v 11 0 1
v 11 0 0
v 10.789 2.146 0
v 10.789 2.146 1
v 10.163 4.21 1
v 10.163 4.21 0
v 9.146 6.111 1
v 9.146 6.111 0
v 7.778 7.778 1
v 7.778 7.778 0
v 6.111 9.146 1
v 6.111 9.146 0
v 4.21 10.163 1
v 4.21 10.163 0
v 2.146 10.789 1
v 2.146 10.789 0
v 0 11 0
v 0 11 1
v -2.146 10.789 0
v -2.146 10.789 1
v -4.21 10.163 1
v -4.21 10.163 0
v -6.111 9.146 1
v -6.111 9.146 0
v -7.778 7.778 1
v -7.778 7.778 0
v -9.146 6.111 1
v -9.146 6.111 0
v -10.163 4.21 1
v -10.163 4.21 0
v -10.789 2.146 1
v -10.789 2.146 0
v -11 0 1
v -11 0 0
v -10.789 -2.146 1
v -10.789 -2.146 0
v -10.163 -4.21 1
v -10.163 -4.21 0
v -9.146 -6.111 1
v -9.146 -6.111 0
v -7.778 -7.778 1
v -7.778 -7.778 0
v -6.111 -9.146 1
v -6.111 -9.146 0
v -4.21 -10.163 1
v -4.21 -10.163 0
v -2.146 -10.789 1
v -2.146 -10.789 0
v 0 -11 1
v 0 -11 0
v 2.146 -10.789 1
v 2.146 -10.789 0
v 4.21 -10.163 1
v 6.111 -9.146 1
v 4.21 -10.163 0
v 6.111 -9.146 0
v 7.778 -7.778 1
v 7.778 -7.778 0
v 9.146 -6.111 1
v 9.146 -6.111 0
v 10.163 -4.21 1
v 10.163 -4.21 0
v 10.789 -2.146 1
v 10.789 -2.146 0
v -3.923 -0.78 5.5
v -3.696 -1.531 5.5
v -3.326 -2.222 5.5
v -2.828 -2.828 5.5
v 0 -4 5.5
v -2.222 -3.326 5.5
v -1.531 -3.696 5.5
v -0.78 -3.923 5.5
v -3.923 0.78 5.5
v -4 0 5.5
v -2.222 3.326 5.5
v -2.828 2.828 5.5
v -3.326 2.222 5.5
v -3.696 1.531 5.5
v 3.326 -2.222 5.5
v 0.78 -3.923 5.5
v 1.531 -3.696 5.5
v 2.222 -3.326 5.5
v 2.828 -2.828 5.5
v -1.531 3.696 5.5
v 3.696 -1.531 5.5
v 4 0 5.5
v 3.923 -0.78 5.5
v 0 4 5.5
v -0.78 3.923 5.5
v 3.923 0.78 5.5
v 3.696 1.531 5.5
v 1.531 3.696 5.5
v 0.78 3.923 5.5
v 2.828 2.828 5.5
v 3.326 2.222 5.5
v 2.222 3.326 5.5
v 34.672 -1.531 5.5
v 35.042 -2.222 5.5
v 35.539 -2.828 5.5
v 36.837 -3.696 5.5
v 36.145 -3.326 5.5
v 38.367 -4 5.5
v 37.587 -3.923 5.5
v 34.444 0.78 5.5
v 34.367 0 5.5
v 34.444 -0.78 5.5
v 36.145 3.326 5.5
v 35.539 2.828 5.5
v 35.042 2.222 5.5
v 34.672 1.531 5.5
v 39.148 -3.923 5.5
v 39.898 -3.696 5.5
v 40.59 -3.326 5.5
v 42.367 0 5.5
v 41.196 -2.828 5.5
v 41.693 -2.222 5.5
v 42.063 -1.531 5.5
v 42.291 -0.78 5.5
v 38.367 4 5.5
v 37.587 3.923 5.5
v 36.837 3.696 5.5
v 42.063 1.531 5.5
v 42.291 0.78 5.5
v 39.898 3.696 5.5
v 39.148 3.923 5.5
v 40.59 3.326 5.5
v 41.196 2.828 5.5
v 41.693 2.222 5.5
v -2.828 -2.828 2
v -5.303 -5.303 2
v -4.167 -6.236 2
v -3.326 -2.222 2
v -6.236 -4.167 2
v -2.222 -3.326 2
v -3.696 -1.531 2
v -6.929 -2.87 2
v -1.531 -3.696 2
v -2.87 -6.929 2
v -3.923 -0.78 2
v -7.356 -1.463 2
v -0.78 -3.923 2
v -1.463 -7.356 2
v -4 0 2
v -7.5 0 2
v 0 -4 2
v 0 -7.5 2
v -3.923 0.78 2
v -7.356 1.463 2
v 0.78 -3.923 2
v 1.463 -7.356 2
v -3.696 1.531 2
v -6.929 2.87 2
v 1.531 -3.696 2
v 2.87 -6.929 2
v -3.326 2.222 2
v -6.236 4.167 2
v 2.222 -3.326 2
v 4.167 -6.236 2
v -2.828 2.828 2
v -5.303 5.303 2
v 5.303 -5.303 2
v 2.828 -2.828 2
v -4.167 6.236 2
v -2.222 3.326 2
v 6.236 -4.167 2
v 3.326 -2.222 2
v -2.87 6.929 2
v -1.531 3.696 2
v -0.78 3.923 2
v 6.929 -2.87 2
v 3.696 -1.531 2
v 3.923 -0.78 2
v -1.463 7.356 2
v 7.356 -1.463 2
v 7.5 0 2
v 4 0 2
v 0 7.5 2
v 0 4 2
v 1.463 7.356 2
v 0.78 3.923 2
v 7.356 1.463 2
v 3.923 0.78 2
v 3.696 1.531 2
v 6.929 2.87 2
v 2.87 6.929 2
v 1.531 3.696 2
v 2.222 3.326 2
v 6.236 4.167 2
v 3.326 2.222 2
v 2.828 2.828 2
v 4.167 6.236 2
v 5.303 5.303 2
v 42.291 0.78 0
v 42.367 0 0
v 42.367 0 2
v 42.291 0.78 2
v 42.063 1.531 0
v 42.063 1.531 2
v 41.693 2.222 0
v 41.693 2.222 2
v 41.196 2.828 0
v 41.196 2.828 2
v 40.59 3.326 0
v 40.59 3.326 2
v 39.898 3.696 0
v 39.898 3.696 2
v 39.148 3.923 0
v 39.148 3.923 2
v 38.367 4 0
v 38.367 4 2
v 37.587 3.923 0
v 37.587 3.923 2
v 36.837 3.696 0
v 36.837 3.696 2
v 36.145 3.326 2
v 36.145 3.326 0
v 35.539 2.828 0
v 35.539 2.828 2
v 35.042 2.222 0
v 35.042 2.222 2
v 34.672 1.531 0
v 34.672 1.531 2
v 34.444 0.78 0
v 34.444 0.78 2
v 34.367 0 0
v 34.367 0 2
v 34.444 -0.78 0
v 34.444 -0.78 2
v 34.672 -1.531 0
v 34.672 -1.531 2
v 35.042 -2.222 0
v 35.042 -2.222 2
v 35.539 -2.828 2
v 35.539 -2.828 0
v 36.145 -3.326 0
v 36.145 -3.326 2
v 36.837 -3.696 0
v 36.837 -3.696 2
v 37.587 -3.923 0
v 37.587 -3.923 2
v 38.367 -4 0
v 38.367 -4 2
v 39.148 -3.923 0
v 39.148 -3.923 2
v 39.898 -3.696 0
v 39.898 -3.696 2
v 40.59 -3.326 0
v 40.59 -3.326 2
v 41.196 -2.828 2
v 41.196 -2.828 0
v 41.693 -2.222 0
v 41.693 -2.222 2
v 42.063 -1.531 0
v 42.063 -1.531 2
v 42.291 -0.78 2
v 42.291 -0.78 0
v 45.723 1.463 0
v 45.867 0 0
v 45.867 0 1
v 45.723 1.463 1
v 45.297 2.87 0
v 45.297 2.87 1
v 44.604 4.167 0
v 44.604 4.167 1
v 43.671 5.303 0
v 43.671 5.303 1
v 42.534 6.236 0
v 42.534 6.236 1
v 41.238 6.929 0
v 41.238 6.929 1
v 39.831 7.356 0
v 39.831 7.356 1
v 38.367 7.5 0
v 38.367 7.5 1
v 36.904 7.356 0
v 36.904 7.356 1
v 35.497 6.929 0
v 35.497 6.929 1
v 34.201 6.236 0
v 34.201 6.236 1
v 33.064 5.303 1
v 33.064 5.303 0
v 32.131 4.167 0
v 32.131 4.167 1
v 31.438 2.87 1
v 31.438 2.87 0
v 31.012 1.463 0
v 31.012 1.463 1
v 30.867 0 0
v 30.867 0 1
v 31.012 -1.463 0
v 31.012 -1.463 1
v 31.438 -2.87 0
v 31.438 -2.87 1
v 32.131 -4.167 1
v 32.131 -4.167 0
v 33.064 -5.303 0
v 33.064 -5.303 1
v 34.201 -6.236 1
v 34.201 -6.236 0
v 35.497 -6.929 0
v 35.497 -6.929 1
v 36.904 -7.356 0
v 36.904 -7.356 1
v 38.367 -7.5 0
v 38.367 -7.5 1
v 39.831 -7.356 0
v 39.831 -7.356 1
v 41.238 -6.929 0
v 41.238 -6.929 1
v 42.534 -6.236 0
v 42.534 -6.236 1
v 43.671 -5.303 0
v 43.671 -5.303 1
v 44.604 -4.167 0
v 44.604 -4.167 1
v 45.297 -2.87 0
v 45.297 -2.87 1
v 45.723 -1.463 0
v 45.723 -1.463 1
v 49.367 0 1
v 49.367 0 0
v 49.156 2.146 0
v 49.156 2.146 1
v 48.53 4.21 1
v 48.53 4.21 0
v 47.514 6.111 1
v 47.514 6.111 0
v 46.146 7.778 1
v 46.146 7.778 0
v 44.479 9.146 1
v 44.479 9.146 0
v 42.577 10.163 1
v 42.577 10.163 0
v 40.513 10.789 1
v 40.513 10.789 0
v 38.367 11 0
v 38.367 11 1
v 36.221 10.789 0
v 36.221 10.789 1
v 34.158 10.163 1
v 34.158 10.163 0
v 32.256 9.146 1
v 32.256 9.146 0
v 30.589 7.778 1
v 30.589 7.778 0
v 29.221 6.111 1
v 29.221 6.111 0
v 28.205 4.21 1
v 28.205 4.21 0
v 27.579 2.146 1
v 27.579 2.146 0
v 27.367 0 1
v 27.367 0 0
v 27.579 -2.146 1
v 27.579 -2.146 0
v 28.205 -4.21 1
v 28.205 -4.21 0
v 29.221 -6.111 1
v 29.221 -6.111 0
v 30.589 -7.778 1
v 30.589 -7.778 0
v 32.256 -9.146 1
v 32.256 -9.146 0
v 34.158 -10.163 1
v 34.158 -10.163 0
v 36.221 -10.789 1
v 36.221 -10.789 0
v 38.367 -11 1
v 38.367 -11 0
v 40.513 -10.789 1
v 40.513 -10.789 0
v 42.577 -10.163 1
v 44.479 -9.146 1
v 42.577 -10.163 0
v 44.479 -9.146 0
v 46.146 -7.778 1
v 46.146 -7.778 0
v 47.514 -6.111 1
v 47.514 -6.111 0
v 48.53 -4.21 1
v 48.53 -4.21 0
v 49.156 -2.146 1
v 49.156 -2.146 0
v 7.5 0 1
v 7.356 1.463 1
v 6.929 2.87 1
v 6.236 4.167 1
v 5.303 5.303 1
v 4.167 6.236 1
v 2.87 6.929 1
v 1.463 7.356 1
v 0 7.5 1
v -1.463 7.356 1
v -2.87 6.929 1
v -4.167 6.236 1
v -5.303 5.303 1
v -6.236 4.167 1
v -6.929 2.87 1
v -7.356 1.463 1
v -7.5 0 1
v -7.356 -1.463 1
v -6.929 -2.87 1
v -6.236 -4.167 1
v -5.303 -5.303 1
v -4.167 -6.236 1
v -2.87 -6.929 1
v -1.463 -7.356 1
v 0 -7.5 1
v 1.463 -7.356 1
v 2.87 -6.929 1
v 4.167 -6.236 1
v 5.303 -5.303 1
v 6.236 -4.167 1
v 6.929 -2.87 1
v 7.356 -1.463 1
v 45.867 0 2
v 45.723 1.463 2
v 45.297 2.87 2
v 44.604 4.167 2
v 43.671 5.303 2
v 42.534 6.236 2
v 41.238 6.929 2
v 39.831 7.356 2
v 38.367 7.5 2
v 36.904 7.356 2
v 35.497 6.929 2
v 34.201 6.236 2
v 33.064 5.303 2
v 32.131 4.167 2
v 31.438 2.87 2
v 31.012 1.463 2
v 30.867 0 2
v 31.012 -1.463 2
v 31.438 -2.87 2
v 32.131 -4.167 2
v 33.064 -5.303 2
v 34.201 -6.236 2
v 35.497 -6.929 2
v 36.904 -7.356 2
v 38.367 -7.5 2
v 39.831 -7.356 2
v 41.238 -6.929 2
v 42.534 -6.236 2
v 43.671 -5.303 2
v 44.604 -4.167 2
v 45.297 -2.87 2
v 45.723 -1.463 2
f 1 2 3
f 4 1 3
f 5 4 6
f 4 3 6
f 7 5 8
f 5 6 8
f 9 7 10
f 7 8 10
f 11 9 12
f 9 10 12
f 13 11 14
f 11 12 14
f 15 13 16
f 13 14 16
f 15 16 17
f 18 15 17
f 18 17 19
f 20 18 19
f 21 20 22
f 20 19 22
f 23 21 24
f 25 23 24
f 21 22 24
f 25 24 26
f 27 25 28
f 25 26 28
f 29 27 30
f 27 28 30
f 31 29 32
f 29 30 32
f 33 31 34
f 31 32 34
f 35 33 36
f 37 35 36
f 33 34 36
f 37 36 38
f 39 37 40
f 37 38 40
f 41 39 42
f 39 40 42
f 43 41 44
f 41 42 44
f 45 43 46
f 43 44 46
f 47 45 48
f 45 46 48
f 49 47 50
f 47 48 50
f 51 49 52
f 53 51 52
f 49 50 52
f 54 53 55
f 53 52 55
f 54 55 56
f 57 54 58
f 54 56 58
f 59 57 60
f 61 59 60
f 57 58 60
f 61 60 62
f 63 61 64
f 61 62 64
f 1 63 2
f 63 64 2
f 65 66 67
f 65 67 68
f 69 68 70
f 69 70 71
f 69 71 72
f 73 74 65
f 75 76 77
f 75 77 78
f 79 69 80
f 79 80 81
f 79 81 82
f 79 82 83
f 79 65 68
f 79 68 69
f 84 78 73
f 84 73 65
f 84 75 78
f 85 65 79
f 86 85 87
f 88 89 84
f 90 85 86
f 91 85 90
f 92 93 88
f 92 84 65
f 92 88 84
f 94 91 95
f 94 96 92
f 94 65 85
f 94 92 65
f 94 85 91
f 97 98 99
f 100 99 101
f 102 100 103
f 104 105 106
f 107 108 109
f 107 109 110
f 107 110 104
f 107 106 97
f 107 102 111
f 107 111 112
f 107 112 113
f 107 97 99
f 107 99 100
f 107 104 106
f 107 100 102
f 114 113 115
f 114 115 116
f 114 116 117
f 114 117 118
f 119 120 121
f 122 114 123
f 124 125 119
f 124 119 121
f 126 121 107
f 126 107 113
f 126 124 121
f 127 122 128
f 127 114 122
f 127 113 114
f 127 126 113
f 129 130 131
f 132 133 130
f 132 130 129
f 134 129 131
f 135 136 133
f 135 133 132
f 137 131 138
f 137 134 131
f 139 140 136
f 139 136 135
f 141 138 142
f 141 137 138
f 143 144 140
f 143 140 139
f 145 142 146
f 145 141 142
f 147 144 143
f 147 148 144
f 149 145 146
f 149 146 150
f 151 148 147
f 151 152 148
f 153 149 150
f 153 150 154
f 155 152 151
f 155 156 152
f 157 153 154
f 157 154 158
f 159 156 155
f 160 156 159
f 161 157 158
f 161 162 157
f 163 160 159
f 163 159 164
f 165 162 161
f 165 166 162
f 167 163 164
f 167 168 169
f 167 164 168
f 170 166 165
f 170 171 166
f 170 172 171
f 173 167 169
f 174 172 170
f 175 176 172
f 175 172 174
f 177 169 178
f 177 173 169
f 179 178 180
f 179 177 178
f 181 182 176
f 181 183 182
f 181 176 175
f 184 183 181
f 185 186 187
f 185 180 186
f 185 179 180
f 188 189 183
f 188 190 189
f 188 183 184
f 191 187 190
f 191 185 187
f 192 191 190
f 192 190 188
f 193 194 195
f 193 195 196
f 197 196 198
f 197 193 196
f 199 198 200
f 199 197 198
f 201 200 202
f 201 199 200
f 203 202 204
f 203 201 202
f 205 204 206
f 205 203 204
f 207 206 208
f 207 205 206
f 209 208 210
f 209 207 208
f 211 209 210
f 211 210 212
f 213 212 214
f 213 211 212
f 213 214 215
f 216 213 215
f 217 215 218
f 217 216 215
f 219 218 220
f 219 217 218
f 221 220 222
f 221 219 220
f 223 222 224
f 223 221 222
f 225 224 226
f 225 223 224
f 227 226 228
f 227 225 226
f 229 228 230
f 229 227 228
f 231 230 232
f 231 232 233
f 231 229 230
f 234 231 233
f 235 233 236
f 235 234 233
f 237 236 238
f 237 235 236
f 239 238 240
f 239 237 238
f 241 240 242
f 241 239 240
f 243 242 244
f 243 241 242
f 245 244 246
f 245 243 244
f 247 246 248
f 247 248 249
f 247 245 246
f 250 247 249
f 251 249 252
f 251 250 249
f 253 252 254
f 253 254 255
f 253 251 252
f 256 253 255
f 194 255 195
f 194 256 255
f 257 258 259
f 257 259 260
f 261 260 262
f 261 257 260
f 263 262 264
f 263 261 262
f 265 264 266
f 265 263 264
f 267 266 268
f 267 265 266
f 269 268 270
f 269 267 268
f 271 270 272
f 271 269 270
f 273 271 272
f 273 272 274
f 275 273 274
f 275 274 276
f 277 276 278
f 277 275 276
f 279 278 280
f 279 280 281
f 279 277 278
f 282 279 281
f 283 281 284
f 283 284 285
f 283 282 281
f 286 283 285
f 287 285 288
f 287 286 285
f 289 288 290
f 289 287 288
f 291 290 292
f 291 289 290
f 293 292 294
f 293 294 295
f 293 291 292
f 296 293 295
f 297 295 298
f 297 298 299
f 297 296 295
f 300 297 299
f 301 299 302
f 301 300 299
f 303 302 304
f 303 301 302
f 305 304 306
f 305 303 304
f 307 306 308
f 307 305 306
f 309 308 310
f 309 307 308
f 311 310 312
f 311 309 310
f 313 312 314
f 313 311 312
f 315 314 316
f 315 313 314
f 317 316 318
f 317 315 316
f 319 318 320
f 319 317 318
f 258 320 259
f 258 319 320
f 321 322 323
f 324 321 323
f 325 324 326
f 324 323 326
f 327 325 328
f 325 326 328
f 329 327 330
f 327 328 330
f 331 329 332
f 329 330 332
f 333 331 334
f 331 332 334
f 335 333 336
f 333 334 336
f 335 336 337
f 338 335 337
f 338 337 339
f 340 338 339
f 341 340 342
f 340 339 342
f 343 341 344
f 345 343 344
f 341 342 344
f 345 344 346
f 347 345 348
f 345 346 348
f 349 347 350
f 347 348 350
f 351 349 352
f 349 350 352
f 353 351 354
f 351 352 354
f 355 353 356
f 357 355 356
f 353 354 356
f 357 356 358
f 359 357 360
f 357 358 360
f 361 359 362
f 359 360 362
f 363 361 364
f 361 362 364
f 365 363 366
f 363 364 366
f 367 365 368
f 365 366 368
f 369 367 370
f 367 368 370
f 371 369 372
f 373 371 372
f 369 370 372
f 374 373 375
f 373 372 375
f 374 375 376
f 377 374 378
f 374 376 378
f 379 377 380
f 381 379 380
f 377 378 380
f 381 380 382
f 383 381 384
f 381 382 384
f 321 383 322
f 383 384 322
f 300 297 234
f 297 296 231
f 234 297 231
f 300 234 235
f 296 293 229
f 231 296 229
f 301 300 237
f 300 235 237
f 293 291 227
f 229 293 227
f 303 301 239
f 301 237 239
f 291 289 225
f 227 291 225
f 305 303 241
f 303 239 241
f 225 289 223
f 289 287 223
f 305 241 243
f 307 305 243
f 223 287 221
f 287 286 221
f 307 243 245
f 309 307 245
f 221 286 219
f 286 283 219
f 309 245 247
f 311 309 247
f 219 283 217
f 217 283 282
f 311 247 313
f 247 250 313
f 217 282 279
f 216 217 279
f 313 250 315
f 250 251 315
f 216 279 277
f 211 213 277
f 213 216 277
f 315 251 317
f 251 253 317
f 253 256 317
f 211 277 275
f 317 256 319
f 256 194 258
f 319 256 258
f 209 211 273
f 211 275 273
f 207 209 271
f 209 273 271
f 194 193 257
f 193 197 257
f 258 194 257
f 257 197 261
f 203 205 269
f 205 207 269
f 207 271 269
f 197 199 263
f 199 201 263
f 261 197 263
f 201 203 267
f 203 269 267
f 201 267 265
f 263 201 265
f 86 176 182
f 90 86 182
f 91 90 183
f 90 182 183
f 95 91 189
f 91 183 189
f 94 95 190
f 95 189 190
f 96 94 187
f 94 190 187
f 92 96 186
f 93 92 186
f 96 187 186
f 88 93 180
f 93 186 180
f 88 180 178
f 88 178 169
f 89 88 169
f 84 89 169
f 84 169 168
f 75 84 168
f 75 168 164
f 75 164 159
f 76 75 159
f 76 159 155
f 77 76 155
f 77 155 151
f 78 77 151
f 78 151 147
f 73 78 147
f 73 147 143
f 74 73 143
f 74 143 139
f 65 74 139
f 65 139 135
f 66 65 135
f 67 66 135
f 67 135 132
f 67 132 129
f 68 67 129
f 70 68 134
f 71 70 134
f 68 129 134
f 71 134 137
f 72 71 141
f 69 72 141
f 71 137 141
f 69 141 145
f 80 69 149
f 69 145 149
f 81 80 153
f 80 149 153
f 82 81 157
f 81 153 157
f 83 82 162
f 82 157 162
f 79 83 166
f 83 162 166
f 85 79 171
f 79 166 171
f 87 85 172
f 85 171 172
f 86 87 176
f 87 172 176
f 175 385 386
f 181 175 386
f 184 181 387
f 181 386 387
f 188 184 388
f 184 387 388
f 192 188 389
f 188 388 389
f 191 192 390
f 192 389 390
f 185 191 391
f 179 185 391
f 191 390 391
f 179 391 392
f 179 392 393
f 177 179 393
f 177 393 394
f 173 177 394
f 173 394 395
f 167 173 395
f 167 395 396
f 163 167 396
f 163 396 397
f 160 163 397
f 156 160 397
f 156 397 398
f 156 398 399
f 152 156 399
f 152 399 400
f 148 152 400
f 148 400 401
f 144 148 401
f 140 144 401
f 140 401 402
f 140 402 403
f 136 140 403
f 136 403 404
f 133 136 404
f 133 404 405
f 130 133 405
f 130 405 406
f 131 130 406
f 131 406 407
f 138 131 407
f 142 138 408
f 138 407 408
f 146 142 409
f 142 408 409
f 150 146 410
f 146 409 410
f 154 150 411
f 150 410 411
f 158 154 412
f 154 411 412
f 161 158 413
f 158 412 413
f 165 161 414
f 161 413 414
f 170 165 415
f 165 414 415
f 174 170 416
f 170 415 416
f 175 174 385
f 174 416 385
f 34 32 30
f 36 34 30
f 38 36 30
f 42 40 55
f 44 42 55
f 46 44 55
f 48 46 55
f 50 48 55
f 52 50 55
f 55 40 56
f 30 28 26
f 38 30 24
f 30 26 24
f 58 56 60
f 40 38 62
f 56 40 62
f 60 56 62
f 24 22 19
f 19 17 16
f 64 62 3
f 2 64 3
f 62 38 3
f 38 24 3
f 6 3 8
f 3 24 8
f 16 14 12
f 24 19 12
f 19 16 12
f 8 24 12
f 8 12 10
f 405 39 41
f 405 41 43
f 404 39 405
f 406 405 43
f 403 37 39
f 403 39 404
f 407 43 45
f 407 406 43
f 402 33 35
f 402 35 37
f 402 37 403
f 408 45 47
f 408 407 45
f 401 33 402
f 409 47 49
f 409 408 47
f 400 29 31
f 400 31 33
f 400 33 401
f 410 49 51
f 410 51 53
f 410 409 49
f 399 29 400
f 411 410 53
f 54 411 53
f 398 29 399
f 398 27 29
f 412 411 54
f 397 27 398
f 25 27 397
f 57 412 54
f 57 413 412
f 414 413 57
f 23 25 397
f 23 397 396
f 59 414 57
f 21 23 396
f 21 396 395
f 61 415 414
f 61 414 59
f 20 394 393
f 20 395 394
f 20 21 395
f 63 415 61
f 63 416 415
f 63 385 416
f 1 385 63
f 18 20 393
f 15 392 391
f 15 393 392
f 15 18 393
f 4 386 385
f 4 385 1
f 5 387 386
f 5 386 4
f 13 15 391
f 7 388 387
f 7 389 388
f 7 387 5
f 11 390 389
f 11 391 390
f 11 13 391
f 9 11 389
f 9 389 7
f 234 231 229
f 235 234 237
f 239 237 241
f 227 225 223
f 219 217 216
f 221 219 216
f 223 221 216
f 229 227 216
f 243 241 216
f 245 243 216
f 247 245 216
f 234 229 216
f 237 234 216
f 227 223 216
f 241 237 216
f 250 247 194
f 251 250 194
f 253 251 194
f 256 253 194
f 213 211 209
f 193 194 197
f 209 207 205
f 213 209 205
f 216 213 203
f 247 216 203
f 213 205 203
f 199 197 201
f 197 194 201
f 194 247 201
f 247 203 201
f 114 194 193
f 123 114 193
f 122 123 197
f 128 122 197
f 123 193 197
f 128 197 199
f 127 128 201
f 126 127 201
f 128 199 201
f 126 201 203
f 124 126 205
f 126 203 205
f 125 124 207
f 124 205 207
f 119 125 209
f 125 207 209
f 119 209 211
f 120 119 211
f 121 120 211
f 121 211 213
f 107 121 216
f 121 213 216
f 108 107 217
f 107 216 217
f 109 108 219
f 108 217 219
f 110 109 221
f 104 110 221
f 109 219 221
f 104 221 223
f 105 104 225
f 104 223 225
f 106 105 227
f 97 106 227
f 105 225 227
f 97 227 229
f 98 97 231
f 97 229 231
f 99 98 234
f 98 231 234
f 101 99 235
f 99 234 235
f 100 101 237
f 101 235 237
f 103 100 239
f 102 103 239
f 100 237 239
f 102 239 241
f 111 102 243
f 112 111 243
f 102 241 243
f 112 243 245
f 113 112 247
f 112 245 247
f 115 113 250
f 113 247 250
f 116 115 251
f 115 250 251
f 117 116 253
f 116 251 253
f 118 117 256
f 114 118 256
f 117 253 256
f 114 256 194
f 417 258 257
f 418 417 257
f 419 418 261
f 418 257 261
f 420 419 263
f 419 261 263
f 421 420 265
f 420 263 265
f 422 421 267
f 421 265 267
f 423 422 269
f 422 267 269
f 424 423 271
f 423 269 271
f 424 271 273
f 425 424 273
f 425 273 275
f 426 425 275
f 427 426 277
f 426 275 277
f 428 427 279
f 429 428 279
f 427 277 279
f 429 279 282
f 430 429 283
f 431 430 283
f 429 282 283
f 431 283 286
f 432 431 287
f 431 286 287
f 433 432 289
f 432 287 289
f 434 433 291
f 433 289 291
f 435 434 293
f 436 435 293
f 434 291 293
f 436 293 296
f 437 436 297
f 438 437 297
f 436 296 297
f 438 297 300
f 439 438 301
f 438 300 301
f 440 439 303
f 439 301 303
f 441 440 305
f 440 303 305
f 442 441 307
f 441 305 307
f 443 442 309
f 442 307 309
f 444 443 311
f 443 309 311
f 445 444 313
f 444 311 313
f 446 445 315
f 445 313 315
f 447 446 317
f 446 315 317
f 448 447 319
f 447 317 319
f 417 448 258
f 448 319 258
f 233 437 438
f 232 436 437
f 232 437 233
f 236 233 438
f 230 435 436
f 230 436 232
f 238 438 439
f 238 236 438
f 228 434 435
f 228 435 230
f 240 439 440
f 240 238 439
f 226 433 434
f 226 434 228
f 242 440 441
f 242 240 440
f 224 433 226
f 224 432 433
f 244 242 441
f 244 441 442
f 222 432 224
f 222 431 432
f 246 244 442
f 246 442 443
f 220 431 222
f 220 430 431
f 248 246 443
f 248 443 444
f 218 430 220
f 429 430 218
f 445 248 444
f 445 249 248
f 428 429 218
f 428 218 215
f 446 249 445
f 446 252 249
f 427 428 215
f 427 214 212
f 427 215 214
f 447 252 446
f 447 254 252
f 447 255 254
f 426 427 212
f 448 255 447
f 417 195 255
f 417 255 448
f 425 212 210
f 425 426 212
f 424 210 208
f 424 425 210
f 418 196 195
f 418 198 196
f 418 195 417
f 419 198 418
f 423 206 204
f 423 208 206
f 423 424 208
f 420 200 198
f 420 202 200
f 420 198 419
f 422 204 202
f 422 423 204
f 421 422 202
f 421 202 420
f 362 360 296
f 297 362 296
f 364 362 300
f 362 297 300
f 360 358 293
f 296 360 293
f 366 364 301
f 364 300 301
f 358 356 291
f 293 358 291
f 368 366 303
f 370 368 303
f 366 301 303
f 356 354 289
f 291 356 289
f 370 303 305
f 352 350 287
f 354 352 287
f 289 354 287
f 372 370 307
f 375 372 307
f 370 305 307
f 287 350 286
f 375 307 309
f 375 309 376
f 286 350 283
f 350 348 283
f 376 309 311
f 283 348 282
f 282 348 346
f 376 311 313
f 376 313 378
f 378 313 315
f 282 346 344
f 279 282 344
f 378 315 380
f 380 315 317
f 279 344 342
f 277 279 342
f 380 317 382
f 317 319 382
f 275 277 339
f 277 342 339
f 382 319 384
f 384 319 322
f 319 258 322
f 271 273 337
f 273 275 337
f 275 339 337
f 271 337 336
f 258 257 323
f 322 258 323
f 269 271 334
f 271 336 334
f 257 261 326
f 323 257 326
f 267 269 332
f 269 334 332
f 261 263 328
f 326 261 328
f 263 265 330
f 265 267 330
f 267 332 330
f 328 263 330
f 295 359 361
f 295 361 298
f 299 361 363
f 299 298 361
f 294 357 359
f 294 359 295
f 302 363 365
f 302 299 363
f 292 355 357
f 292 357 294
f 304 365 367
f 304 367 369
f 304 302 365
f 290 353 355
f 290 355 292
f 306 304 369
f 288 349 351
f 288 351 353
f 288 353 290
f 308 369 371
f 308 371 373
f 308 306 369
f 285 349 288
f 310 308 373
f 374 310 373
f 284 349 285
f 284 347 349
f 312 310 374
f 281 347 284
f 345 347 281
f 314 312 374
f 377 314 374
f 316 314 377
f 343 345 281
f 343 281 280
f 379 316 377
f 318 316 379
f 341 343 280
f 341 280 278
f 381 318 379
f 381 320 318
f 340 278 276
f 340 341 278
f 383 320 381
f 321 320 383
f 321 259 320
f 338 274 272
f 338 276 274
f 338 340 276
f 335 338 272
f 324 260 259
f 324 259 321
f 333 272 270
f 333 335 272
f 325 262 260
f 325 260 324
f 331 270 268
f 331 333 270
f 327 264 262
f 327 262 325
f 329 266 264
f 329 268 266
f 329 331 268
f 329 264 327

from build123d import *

# Parameters (mm, degrees)
F0_R     = 11
F0_R_2   = 7.5
F1_DEPTH = 1
F0_R_3   = 4
F2_DEPTH = 2
F3_DEPTH = 5.5


with BuildPart() as f1:
    # F0 (on Top) → F1 (new body)
    with BuildSketch(Plane.XY):
        Circle(F0_R)
        Circle(F0_R_2, mode=Mode.SUBTRACT)
    extrude(amount=F1_DEPTH)

    # F0 (on Top) → F2 (join)
    with BuildSketch(Plane.XY):
        Circle(F0_R_2)
        Circle(F0_R_3, mode=Mode.SUBTRACT)
    extrude(amount=F2_DEPTH)

    # F0 (on Top) → F3 (join)
    with BuildSketch(Plane.XY):
        Circle(F0_R_3)
    extrude(amount=F3_DEPTH)


with BuildPart() as f1b:
    # F0 (on Top) → F1, piece 2 (new body)
    with BuildSketch(Plane.XY):
        with Locations((38.3674800396, 0)):
            Circle(F0_R)
        with Locations((38.3674800396, 0)):
            Circle(F0_R_2, mode=Mode.SUBTRACT)
    extrude(amount=F1_DEPTH)


with BuildPart() as f2:
    # F0 (on Top) → F2, piece 2 (new body)
    with BuildSketch(Plane.XY):
        with Locations((38.3674800396, 0)):
            Circle(F0_R_2)
        with Locations((38.3674800396, 0)):
            Circle(F0_R_3, mode=Mode.SUBTRACT)
    extrude(amount=F2_DEPTH)


with BuildPart() as f3:
    # F0 (on Top) → F3, piece 2 (new body)
    with BuildSketch(Plane.XY):
        with Locations((38.3674800396, 0)):
            Circle(F0_R_3)
    extrude(amount=F3_DEPTH)


solid = Compound([f1.part, f1b.part, f2.part, f3.part])
